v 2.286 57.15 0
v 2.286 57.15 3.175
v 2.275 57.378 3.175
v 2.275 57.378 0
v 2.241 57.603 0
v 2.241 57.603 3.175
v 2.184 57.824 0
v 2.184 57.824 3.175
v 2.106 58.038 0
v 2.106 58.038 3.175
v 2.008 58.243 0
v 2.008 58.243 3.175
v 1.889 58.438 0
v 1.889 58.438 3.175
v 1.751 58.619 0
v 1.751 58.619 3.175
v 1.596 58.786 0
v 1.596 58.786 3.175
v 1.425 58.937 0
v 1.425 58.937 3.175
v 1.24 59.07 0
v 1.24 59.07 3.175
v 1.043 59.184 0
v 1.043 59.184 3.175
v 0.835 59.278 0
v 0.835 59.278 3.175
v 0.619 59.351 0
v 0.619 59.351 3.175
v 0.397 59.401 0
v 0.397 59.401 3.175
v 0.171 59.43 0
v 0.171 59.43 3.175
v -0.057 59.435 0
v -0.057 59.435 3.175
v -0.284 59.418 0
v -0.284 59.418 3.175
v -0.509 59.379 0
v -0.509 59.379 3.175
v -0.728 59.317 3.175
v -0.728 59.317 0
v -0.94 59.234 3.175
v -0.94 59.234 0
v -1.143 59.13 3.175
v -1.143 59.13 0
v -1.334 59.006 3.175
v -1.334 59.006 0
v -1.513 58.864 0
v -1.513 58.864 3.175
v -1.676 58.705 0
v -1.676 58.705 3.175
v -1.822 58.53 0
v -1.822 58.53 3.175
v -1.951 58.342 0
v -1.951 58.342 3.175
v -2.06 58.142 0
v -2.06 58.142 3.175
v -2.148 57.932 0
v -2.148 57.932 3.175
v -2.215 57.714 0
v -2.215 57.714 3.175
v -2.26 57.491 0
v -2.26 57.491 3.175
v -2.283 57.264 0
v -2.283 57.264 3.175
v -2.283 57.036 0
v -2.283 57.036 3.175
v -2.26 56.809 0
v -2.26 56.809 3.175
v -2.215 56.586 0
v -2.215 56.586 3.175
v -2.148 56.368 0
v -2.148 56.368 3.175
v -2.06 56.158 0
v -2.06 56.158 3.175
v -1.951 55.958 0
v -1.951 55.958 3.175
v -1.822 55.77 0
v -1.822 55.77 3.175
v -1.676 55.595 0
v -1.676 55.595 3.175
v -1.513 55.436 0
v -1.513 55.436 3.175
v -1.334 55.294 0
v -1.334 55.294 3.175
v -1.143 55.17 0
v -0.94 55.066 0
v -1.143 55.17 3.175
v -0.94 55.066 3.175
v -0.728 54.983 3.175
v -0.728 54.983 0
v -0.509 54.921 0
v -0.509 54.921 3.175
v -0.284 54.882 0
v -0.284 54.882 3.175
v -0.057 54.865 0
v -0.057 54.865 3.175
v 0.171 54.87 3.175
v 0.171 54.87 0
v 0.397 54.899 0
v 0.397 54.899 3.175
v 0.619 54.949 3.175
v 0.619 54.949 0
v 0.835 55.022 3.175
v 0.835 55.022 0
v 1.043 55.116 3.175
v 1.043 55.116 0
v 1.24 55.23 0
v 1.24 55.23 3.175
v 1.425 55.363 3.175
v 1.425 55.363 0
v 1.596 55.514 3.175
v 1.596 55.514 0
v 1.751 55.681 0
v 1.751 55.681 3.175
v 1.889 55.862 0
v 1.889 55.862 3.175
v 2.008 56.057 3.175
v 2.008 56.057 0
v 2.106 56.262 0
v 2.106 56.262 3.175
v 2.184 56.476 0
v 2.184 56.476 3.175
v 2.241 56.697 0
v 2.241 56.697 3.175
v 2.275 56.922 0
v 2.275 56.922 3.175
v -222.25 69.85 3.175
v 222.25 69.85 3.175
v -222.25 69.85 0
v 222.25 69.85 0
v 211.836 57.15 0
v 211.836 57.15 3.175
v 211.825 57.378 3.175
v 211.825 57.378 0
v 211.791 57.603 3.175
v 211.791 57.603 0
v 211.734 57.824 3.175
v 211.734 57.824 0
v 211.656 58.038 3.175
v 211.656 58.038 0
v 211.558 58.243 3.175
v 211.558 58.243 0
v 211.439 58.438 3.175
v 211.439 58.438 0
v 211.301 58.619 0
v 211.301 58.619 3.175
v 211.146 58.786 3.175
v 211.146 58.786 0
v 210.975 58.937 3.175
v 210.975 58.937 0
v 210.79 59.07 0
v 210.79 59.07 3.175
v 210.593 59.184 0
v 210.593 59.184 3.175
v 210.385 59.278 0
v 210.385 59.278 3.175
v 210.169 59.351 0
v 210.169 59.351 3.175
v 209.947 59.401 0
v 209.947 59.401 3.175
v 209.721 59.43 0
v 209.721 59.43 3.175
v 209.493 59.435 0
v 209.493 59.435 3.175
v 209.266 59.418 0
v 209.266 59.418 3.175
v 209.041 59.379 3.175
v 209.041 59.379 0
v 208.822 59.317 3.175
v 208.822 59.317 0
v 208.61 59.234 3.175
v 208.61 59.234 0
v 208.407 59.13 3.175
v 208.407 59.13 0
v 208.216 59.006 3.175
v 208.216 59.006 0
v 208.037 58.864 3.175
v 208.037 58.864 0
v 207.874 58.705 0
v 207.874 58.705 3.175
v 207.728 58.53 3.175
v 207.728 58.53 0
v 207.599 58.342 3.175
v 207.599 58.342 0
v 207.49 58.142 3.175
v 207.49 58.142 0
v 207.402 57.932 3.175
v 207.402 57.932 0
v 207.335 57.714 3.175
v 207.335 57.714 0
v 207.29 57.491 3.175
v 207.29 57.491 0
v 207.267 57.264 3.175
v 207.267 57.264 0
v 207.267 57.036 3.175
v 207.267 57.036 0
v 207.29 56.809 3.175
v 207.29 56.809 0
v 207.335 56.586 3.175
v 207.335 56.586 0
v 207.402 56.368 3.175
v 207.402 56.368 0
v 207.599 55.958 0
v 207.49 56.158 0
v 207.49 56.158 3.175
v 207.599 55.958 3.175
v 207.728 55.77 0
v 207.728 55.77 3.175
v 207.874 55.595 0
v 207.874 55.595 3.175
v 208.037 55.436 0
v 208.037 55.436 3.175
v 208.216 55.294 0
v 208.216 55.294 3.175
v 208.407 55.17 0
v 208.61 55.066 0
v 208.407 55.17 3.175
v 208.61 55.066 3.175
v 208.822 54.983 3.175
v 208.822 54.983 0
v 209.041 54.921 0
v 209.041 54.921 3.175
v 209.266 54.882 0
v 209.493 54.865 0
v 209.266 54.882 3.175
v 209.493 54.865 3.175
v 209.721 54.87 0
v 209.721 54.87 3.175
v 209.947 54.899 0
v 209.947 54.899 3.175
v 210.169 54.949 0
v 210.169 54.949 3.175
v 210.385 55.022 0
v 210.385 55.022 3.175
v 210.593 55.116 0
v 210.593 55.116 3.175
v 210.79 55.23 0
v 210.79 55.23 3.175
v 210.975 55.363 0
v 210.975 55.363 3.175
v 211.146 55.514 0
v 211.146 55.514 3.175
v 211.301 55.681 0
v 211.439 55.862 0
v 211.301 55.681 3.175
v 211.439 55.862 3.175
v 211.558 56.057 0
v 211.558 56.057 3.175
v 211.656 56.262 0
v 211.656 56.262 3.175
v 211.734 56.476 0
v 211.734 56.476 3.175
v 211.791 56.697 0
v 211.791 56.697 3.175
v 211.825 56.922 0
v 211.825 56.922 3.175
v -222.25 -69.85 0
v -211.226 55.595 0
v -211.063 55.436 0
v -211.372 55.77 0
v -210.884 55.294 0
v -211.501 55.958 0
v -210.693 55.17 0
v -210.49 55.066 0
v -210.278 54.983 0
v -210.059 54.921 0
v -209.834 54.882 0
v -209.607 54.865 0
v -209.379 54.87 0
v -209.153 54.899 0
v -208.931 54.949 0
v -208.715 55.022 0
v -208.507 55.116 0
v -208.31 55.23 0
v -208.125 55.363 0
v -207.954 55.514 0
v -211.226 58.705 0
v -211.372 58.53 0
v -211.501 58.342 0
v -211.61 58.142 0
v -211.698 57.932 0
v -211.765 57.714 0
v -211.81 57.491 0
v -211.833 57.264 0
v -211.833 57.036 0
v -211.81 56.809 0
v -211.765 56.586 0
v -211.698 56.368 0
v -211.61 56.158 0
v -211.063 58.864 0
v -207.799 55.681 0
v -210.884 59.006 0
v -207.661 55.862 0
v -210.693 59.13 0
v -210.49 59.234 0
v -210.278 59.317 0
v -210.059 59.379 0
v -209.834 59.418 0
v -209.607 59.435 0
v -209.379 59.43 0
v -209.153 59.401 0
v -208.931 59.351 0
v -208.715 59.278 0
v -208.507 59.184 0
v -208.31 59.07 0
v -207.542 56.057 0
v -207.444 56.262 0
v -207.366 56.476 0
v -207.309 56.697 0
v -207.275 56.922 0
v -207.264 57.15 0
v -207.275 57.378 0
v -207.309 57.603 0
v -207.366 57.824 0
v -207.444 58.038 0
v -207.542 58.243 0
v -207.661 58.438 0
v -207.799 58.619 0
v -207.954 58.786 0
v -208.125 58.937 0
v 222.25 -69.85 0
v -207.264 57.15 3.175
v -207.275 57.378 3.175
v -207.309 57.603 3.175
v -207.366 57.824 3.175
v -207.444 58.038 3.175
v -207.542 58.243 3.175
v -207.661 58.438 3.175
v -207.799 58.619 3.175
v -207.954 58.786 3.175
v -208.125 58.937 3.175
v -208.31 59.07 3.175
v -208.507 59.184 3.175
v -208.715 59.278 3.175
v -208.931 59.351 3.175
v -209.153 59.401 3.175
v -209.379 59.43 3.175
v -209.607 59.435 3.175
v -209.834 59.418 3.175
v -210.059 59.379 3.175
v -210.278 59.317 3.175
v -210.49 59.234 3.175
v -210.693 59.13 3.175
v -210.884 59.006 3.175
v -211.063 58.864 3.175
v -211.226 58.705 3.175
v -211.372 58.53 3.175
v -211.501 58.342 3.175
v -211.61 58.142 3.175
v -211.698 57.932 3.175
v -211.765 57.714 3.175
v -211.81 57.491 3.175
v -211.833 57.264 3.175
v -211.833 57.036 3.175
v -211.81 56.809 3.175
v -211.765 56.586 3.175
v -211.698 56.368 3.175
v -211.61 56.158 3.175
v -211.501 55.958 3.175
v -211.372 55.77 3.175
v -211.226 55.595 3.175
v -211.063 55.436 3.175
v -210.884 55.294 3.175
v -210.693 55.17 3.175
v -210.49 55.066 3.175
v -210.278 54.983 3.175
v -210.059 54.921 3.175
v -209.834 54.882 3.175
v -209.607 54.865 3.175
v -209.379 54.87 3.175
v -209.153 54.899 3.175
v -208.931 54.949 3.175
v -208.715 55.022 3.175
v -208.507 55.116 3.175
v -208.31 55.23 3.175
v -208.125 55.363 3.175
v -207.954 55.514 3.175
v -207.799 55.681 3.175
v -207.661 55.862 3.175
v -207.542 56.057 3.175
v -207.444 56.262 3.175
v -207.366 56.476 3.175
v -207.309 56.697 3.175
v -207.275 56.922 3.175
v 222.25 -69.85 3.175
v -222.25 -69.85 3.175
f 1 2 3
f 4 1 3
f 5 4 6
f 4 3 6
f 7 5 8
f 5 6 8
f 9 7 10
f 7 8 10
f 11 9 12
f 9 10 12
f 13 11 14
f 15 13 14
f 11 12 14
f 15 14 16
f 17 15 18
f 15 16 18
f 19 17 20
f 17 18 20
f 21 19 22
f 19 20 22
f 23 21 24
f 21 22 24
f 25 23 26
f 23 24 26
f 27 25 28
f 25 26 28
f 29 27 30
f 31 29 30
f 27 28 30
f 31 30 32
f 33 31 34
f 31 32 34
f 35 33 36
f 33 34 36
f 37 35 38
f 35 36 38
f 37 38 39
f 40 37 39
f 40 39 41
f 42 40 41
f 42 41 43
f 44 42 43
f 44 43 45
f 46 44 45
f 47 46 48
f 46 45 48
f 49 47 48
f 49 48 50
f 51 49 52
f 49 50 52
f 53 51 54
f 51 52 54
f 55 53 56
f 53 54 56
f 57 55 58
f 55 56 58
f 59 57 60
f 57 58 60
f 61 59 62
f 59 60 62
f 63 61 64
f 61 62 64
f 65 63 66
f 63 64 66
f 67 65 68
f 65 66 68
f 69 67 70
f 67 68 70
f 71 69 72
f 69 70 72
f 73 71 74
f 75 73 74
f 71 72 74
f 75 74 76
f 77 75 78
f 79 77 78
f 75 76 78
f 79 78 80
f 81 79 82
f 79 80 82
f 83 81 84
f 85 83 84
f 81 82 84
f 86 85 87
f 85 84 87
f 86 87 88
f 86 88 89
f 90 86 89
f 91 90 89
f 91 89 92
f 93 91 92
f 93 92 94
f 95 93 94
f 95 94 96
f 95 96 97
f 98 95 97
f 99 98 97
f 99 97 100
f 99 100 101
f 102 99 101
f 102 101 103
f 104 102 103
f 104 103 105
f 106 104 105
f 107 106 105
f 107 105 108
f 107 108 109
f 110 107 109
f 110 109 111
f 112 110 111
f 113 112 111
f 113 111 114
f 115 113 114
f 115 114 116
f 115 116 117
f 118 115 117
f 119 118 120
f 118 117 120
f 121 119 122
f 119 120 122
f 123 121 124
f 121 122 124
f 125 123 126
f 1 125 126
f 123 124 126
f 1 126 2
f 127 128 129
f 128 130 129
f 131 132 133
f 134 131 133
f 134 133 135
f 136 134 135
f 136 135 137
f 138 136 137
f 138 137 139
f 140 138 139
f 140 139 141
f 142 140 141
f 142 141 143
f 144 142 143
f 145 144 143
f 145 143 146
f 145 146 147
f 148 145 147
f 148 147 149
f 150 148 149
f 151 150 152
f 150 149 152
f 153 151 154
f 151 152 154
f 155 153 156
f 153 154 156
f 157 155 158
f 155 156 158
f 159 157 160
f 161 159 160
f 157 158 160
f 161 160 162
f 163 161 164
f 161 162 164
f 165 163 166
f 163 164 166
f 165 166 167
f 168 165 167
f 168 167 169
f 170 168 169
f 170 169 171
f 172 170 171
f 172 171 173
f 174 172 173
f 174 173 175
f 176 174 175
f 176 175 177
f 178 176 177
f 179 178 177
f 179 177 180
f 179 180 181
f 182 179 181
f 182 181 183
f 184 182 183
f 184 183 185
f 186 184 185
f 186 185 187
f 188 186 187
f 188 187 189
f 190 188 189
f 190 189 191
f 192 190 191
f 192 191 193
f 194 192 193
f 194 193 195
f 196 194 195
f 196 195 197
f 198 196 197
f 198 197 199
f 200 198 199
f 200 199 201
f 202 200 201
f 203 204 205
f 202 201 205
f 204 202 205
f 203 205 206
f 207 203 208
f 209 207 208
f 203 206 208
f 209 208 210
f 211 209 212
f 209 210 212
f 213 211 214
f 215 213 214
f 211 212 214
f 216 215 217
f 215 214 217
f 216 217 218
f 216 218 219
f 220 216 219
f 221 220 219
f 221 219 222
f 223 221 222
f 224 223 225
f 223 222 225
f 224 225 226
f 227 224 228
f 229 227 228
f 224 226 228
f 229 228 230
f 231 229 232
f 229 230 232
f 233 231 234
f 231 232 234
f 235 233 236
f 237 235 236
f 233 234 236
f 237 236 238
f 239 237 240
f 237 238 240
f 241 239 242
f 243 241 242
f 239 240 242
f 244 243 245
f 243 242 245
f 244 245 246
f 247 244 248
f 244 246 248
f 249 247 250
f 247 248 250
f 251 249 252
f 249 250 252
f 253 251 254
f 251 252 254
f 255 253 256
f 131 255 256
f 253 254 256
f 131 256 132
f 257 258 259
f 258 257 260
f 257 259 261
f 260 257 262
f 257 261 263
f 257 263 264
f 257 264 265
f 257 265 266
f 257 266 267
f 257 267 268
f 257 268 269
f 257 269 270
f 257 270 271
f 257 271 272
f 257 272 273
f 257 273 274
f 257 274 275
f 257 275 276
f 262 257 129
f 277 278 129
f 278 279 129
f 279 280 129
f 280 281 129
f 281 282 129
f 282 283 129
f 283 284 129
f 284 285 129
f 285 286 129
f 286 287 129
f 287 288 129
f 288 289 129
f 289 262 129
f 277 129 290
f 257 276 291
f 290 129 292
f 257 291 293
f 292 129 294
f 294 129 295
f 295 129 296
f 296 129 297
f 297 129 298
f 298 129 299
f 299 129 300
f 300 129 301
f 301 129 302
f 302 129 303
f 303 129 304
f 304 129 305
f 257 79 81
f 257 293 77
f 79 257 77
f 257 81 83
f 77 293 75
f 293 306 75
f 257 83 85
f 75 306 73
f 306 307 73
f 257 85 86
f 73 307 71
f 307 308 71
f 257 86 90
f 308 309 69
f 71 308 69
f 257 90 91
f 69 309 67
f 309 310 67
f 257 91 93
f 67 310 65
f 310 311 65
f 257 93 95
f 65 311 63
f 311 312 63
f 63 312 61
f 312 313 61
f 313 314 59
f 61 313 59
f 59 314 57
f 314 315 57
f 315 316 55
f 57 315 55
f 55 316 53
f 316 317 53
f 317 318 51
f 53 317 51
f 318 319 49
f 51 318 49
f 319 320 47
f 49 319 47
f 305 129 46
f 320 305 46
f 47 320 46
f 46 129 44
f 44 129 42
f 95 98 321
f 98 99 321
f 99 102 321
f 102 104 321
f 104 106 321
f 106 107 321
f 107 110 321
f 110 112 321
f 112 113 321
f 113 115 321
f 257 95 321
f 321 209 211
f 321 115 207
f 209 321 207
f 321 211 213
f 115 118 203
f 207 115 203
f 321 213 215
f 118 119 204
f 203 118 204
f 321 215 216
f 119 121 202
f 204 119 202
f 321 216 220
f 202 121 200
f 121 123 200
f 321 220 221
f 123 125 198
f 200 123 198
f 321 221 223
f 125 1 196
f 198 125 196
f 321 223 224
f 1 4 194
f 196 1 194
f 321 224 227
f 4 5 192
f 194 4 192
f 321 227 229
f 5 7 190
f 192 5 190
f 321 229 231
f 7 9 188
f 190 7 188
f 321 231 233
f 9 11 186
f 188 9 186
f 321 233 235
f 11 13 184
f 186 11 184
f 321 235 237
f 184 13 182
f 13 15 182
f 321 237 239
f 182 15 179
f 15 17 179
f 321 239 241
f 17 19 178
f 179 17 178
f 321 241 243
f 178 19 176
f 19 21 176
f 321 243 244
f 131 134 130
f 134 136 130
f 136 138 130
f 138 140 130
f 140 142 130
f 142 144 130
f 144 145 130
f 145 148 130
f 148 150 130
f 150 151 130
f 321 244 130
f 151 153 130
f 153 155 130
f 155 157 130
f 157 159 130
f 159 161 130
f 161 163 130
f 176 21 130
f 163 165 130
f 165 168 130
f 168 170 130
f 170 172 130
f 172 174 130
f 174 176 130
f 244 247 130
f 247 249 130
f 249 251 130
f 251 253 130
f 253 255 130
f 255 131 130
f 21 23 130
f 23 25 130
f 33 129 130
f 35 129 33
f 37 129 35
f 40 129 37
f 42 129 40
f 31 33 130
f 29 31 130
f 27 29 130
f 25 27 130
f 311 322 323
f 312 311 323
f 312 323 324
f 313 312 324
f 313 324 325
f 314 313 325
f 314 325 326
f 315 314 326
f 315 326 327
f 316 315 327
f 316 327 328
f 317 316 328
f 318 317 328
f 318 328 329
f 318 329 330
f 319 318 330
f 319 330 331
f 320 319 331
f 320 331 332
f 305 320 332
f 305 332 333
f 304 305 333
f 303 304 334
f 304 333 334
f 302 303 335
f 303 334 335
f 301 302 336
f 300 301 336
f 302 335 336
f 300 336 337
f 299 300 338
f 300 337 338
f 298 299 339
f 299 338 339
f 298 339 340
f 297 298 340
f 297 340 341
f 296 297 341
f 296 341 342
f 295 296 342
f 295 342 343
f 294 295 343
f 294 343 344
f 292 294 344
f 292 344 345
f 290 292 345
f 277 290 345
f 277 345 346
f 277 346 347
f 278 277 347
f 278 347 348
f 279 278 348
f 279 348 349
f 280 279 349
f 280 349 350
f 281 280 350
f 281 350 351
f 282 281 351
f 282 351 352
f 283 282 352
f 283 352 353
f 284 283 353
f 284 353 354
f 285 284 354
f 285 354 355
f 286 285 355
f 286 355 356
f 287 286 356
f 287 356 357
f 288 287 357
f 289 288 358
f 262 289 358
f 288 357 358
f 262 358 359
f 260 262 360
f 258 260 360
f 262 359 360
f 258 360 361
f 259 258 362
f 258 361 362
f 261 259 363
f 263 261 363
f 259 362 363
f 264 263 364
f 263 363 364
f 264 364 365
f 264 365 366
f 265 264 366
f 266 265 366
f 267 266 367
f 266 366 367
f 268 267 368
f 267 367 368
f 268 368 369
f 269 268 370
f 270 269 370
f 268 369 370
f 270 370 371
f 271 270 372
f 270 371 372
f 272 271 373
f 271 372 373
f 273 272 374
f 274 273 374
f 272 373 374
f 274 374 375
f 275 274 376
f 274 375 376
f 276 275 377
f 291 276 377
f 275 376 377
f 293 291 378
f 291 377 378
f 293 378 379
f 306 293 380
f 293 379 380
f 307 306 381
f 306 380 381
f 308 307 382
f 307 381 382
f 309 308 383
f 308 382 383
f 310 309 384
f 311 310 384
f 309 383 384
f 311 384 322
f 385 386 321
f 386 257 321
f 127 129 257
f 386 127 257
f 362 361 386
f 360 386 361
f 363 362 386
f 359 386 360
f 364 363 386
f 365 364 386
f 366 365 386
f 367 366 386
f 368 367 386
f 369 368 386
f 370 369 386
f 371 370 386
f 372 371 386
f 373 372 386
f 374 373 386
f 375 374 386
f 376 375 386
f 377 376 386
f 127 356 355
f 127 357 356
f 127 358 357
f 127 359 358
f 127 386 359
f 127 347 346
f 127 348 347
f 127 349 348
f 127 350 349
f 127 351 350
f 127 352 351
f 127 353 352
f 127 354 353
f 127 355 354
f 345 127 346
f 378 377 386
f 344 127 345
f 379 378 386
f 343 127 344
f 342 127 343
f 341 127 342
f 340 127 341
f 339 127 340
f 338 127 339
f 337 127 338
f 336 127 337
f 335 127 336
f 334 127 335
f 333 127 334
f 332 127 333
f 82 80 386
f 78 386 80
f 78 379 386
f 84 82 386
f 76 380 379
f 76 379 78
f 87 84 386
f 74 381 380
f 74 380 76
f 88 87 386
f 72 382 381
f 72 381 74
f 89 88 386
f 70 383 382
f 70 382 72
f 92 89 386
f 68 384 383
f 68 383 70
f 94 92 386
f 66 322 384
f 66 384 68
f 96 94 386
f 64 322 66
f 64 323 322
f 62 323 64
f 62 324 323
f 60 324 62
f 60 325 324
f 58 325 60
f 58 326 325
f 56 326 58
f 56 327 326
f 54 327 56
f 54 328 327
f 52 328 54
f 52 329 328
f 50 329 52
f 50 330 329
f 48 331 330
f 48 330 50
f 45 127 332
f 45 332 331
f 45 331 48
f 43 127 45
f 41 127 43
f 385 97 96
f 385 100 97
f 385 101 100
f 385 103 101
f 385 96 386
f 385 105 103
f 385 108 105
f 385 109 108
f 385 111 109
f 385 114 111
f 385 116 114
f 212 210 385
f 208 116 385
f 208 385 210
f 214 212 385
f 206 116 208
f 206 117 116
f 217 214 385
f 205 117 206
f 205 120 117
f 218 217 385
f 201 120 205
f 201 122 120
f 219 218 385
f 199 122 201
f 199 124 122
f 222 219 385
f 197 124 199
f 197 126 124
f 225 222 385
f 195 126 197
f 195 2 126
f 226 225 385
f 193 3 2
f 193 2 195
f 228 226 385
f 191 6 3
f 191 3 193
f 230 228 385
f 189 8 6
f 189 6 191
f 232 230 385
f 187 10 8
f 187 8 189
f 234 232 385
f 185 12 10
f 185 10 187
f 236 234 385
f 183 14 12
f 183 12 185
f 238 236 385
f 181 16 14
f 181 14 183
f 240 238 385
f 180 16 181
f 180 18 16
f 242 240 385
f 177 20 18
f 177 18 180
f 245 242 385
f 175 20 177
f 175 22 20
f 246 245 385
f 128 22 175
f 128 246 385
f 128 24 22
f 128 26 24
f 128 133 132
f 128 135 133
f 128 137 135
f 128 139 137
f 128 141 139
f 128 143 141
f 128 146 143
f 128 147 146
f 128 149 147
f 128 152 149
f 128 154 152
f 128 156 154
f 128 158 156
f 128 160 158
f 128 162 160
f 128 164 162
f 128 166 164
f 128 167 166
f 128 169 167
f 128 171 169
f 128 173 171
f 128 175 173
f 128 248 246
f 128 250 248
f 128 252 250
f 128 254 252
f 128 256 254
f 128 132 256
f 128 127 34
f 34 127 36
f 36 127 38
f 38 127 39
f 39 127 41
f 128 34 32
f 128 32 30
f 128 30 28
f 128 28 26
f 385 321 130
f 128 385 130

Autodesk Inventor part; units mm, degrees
ref_plane "YZ Plane" through (0, 0, 0) normal (1, 0, 0) x (0, 1, 0)
ref_plane "XZ Plane" through (0, 0, 0) normal (0, 1, 0) x (-1, 0, 0)
ref_plane "XY Plane" through (0, 0, 0) normal (0, 0, 1) x (1, 0, 0)
sketch "Sketch1" plane through (0, 0, 0) normal (0, 0, 1) x (1, 0, 0)
  line L0 (-222.25, -69.85) -> (222.25, -69.85)
  line L1 (222.25, -69.85) -> (222.25, 69.85)
  line L2 (222.25, 69.85) -> (-222.25, 69.85)
  line L3 (-222.25, 69.85) -> (-222.25, -69.85)
  line L4 (-222.25, -69.85) -> (222.25, 69.85) construction
  line L5 (222.25, -69.85) -> (-222.25, 69.85) construction
  point P0 (0, 0)
  dimension "d0" = 444.5
  dimension "d1" = 139.7
extrude "Extrusion1" add sketch "Sketch1" along normal blind 3.175
sketch "Sketch2" plane through (0, 0, 3.175) normal (0, 0, 1) x (1, 0, 0)
  circle A0 centre (209.55, 57.15) radius 2.286
  line L0 (222.25, -69.85) -> (222.25, 69.85) projected
  line L1 (222.25, 69.85) -> (-222.25, 69.85) projected
  circle A1 centre (-209.55, 57.15) radius 2.286
  line L2 (-222.25, 69.85) -> (-222.25, -69.85) projected
  circle A2 centre (0, 57.15) radius 2.286
  point P0 (0, 0)
  dimension "d4" = 4.572
  dimension "d5" = 12.7
  dimension "d6" = 12.7
  dimension "d7" = 4.572
  dimension "d8" = 12.7
  dimension "d9" = 12.7
  dimension "d10" = 4.572
  dimension "d11" = 12.7
extrude "Extrusion2" cut sketch "Sketch2" against normal blind 3.175
properties part number "Drive Side Plates"
